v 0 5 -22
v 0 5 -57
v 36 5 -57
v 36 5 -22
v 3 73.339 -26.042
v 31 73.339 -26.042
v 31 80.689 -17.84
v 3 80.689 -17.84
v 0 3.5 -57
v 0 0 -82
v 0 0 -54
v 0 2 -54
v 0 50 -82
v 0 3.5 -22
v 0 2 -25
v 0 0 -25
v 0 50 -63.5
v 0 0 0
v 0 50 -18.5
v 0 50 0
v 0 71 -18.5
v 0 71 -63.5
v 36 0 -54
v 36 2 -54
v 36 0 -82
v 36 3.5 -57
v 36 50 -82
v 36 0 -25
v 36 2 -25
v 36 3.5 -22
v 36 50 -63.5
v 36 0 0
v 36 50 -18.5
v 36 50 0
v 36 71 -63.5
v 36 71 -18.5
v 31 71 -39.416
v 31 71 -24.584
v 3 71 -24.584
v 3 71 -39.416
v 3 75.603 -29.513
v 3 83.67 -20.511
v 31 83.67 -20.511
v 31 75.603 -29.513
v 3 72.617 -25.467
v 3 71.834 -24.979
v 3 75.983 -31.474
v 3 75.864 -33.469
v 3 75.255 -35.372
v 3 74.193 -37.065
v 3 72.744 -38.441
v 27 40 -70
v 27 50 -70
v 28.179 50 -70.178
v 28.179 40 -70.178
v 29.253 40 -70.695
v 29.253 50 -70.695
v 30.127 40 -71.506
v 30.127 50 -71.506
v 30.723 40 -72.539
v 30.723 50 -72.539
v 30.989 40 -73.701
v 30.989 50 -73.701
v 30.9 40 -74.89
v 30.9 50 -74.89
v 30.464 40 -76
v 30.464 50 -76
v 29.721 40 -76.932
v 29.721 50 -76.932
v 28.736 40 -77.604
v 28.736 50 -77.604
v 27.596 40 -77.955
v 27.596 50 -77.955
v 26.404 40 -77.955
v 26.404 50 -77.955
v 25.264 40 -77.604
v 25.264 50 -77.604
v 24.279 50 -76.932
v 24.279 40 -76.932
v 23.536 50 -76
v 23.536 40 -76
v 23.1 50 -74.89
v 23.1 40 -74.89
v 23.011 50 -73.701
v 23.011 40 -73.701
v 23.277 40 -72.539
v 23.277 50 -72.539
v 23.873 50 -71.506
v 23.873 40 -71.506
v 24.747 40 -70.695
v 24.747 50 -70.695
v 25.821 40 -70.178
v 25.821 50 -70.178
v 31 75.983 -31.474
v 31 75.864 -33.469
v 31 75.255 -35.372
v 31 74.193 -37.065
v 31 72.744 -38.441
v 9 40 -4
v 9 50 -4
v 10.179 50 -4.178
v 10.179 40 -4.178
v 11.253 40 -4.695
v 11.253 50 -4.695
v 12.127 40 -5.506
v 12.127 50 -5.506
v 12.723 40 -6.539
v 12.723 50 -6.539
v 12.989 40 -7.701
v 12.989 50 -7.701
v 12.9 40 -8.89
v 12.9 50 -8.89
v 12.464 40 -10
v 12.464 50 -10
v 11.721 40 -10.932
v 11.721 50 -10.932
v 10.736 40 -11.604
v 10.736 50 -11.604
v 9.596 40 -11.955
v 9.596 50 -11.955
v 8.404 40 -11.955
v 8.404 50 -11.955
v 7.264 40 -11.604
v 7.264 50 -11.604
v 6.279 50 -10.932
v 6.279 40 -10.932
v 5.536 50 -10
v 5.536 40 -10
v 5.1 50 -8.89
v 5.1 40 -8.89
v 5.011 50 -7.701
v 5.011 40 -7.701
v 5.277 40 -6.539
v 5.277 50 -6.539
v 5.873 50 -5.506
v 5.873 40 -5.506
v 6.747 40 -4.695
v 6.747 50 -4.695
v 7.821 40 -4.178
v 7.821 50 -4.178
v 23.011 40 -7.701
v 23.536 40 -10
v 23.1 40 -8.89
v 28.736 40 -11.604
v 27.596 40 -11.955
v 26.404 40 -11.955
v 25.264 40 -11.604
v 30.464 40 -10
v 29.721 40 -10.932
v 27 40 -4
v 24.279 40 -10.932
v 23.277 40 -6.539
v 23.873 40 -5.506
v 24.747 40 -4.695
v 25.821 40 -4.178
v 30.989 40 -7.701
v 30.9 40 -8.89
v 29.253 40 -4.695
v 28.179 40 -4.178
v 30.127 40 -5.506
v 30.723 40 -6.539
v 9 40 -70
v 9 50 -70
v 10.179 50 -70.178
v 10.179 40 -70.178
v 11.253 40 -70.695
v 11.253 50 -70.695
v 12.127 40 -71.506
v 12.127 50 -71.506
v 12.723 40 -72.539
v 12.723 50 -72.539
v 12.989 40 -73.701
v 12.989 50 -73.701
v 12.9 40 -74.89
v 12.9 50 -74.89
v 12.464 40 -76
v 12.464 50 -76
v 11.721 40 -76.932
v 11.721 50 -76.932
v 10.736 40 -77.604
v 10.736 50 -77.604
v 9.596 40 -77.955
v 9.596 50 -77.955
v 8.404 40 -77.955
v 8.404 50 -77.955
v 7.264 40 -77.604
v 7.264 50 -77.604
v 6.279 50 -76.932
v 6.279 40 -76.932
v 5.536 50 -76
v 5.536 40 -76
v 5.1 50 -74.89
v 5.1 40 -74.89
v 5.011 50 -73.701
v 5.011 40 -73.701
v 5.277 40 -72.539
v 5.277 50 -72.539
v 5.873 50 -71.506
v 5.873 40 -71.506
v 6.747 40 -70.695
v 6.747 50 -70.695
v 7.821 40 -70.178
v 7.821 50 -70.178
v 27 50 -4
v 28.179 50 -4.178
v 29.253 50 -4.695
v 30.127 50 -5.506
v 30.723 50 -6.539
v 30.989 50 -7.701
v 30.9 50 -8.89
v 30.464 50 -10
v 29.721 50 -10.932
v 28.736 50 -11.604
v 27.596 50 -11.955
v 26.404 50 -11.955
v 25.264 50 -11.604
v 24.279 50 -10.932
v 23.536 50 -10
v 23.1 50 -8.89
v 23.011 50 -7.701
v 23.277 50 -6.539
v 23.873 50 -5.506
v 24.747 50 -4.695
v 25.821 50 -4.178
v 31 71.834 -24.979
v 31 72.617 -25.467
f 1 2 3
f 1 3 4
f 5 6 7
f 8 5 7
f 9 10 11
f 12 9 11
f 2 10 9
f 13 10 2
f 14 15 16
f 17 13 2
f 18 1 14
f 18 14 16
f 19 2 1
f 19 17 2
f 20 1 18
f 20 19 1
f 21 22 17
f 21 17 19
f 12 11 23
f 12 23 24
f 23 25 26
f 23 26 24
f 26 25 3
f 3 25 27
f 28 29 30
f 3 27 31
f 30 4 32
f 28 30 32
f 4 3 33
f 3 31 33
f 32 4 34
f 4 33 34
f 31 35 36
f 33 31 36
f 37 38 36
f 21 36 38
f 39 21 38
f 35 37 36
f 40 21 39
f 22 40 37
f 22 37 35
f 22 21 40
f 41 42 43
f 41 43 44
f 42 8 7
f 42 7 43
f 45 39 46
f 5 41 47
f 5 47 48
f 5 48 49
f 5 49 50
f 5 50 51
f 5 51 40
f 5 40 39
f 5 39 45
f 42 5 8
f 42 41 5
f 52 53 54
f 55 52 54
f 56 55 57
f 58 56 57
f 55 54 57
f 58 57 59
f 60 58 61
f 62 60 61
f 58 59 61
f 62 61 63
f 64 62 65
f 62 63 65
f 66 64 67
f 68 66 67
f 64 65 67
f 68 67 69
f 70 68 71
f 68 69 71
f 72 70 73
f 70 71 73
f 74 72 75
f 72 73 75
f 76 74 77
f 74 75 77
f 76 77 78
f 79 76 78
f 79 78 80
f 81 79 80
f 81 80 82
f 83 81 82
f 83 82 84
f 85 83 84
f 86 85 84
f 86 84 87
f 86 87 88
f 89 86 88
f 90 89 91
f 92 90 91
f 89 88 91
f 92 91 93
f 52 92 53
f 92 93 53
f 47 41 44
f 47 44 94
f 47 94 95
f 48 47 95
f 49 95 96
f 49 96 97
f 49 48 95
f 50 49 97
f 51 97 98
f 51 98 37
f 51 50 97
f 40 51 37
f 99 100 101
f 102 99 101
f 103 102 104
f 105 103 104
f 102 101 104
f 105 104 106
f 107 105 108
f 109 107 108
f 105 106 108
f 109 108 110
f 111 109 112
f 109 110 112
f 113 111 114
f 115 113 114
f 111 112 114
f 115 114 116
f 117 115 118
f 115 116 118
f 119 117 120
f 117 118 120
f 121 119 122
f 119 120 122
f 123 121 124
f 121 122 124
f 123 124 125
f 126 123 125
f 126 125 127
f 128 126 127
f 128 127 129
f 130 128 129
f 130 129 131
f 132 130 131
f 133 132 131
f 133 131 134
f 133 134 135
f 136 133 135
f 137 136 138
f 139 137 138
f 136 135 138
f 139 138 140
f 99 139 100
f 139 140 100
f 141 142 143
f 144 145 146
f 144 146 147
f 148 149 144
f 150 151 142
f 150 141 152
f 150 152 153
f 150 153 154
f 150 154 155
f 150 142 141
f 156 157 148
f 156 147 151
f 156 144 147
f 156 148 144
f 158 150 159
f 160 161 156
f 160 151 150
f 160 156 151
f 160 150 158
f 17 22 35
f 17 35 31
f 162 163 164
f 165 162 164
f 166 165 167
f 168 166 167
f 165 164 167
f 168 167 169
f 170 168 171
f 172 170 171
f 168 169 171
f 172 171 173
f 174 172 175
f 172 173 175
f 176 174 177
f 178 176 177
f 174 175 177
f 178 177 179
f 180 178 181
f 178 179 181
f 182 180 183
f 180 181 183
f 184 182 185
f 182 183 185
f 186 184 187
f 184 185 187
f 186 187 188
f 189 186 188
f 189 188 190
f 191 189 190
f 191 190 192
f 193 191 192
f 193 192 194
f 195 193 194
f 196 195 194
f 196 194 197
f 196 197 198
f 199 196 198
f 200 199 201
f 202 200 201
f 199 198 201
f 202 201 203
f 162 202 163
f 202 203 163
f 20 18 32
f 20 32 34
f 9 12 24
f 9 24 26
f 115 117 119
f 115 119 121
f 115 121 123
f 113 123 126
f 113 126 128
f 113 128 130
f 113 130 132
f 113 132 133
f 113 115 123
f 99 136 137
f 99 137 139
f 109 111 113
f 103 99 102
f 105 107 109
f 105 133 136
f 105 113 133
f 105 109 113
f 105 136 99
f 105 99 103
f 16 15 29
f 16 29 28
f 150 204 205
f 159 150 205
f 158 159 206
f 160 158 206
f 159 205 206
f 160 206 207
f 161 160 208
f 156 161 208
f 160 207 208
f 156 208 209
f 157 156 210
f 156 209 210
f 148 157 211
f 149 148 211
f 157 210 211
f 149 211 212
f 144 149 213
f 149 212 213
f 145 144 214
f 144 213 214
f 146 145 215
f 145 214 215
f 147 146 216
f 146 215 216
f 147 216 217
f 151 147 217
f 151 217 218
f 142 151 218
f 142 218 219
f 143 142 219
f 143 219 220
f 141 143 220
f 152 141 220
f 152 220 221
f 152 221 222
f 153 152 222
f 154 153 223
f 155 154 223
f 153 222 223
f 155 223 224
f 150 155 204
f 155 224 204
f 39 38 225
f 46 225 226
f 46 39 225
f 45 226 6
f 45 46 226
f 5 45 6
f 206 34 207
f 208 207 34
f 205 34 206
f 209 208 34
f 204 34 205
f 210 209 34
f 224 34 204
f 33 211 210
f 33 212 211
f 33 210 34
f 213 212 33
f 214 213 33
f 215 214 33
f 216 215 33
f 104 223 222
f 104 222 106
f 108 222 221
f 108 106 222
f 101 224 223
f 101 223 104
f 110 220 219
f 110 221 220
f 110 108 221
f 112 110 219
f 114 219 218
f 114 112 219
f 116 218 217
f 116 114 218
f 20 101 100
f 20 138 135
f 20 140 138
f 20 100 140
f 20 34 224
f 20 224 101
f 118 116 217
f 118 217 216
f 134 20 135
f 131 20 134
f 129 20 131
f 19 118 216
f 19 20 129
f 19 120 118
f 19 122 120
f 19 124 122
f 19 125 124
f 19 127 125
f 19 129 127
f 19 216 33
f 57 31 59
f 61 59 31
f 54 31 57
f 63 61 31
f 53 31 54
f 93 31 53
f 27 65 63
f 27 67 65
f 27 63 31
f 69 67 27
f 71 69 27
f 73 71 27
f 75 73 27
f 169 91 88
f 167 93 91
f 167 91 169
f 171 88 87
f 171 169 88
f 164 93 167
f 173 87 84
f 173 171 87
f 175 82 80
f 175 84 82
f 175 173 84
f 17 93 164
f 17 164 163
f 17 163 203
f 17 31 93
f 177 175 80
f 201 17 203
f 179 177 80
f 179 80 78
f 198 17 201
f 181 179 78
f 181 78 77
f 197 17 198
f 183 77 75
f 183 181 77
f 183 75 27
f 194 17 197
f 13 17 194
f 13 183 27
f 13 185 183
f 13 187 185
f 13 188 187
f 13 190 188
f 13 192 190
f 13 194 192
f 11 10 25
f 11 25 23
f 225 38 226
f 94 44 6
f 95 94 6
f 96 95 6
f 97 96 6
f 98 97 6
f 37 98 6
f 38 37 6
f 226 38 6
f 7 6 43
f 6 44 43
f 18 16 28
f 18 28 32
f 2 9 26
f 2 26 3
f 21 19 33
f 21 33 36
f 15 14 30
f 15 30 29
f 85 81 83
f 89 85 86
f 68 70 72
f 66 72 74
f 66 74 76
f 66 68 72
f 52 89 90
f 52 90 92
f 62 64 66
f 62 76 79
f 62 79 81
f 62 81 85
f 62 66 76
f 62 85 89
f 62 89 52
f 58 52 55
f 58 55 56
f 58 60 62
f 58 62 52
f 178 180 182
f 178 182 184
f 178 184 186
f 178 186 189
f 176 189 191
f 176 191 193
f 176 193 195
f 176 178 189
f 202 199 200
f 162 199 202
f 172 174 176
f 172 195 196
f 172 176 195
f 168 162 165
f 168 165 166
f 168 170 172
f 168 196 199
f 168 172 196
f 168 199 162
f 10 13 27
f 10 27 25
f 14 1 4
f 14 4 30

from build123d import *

# Parameters (mm, degrees)
BASE_EXTRUSION_DEPTH    = 36
BOSS_EXTRU_3_DEPTH      = 28
ESQUISSE6_R             = 4
ENL_V_MAT_EXTRU_2_DEPTH = 10


with BuildPart() as part:
    # Esquisse1 → Base-Extrusion (new body)
    with BuildSketch(Plane(origin=(0, 0, 0), x_dir=(0, 0, -1), z_dir=(1, 0, 0))):
        Polygon((0, 0), (0, 50), (18.5, 50), (18.5, 71), (63.5, 71), (63.5, 50), (82, 50), (82, 0), (54, 0), (54, 2), (57, 3.5), (57, 5), (22, 5), (22, 3.5), (25, 2), (25, 0), align=None)
    extrude(amount=BASE_EXTRUSION_DEPTH)

    # Esquisse5 → Boss.-Extru.3 (add)
    with BuildSketch(Plane(origin=(3, 0, 0), x_dir=(0, 0, -1), z_dir=(1, 0, 0))):
        with BuildLine():
            Line((26.042142261, 73.3389073), (17.839623353, 80.689282216))
            Line((17.839623353, 80.689282216), (20.510768328, 83.670098489))
            Line((20.510768328, 83.670098489), (29.512578974, 75.603468724))
            ThreePointArc((29.512578974, 75.603468724), (36.695776389, 74.476857579), (40, 68))
            Line((40, 68), (24, 68))
            ThreePointArc((24, 68), (24.527956708, 70.858070861), (26.042142261, 73.3389073))
        make_face()
    extrude(amount=BOSS_EXTRU_3_DEPTH)

    # Esquisse6 → Enlèv. mat.-Extru.2 (cut)
    with BuildSketch(Plane(origin=(0, 50, 0), x_dir=(-1, 0, 0), z_dir=(0, 1, 0))):
        with Locations(Location((-9, -8, 0), (0, 0, 90))):
            Circle(ESQUISSE6_R)
        with Locations(Location((-27, -8, 0), (0, 0, 90))):
            Circle(ESQUISSE6_R)
        with Locations((-45, -8)):
            Circle(ESQUISSE6_R)
        with Locations((-63, -8)):
            Circle(ESQUISSE6_R)
        with Locations(Location((-9, -74, 0), (0, 0, 90))):
            Circle(ESQUISSE6_R)
        with Locations(Location((-27, -74, 0), (0, 0, 90))):
            Circle(ESQUISSE6_R)
        with Locations((-45, -74)):
            Circle(ESQUISSE6_R)
        with Locations((-63, -74)):
            Circle(ESQUISSE6_R)
    extrude(amount=-ENL_V_MAT_EXTRU_2_DEPTH, mode=Mode.SUBTRACT)


solid = part.part
